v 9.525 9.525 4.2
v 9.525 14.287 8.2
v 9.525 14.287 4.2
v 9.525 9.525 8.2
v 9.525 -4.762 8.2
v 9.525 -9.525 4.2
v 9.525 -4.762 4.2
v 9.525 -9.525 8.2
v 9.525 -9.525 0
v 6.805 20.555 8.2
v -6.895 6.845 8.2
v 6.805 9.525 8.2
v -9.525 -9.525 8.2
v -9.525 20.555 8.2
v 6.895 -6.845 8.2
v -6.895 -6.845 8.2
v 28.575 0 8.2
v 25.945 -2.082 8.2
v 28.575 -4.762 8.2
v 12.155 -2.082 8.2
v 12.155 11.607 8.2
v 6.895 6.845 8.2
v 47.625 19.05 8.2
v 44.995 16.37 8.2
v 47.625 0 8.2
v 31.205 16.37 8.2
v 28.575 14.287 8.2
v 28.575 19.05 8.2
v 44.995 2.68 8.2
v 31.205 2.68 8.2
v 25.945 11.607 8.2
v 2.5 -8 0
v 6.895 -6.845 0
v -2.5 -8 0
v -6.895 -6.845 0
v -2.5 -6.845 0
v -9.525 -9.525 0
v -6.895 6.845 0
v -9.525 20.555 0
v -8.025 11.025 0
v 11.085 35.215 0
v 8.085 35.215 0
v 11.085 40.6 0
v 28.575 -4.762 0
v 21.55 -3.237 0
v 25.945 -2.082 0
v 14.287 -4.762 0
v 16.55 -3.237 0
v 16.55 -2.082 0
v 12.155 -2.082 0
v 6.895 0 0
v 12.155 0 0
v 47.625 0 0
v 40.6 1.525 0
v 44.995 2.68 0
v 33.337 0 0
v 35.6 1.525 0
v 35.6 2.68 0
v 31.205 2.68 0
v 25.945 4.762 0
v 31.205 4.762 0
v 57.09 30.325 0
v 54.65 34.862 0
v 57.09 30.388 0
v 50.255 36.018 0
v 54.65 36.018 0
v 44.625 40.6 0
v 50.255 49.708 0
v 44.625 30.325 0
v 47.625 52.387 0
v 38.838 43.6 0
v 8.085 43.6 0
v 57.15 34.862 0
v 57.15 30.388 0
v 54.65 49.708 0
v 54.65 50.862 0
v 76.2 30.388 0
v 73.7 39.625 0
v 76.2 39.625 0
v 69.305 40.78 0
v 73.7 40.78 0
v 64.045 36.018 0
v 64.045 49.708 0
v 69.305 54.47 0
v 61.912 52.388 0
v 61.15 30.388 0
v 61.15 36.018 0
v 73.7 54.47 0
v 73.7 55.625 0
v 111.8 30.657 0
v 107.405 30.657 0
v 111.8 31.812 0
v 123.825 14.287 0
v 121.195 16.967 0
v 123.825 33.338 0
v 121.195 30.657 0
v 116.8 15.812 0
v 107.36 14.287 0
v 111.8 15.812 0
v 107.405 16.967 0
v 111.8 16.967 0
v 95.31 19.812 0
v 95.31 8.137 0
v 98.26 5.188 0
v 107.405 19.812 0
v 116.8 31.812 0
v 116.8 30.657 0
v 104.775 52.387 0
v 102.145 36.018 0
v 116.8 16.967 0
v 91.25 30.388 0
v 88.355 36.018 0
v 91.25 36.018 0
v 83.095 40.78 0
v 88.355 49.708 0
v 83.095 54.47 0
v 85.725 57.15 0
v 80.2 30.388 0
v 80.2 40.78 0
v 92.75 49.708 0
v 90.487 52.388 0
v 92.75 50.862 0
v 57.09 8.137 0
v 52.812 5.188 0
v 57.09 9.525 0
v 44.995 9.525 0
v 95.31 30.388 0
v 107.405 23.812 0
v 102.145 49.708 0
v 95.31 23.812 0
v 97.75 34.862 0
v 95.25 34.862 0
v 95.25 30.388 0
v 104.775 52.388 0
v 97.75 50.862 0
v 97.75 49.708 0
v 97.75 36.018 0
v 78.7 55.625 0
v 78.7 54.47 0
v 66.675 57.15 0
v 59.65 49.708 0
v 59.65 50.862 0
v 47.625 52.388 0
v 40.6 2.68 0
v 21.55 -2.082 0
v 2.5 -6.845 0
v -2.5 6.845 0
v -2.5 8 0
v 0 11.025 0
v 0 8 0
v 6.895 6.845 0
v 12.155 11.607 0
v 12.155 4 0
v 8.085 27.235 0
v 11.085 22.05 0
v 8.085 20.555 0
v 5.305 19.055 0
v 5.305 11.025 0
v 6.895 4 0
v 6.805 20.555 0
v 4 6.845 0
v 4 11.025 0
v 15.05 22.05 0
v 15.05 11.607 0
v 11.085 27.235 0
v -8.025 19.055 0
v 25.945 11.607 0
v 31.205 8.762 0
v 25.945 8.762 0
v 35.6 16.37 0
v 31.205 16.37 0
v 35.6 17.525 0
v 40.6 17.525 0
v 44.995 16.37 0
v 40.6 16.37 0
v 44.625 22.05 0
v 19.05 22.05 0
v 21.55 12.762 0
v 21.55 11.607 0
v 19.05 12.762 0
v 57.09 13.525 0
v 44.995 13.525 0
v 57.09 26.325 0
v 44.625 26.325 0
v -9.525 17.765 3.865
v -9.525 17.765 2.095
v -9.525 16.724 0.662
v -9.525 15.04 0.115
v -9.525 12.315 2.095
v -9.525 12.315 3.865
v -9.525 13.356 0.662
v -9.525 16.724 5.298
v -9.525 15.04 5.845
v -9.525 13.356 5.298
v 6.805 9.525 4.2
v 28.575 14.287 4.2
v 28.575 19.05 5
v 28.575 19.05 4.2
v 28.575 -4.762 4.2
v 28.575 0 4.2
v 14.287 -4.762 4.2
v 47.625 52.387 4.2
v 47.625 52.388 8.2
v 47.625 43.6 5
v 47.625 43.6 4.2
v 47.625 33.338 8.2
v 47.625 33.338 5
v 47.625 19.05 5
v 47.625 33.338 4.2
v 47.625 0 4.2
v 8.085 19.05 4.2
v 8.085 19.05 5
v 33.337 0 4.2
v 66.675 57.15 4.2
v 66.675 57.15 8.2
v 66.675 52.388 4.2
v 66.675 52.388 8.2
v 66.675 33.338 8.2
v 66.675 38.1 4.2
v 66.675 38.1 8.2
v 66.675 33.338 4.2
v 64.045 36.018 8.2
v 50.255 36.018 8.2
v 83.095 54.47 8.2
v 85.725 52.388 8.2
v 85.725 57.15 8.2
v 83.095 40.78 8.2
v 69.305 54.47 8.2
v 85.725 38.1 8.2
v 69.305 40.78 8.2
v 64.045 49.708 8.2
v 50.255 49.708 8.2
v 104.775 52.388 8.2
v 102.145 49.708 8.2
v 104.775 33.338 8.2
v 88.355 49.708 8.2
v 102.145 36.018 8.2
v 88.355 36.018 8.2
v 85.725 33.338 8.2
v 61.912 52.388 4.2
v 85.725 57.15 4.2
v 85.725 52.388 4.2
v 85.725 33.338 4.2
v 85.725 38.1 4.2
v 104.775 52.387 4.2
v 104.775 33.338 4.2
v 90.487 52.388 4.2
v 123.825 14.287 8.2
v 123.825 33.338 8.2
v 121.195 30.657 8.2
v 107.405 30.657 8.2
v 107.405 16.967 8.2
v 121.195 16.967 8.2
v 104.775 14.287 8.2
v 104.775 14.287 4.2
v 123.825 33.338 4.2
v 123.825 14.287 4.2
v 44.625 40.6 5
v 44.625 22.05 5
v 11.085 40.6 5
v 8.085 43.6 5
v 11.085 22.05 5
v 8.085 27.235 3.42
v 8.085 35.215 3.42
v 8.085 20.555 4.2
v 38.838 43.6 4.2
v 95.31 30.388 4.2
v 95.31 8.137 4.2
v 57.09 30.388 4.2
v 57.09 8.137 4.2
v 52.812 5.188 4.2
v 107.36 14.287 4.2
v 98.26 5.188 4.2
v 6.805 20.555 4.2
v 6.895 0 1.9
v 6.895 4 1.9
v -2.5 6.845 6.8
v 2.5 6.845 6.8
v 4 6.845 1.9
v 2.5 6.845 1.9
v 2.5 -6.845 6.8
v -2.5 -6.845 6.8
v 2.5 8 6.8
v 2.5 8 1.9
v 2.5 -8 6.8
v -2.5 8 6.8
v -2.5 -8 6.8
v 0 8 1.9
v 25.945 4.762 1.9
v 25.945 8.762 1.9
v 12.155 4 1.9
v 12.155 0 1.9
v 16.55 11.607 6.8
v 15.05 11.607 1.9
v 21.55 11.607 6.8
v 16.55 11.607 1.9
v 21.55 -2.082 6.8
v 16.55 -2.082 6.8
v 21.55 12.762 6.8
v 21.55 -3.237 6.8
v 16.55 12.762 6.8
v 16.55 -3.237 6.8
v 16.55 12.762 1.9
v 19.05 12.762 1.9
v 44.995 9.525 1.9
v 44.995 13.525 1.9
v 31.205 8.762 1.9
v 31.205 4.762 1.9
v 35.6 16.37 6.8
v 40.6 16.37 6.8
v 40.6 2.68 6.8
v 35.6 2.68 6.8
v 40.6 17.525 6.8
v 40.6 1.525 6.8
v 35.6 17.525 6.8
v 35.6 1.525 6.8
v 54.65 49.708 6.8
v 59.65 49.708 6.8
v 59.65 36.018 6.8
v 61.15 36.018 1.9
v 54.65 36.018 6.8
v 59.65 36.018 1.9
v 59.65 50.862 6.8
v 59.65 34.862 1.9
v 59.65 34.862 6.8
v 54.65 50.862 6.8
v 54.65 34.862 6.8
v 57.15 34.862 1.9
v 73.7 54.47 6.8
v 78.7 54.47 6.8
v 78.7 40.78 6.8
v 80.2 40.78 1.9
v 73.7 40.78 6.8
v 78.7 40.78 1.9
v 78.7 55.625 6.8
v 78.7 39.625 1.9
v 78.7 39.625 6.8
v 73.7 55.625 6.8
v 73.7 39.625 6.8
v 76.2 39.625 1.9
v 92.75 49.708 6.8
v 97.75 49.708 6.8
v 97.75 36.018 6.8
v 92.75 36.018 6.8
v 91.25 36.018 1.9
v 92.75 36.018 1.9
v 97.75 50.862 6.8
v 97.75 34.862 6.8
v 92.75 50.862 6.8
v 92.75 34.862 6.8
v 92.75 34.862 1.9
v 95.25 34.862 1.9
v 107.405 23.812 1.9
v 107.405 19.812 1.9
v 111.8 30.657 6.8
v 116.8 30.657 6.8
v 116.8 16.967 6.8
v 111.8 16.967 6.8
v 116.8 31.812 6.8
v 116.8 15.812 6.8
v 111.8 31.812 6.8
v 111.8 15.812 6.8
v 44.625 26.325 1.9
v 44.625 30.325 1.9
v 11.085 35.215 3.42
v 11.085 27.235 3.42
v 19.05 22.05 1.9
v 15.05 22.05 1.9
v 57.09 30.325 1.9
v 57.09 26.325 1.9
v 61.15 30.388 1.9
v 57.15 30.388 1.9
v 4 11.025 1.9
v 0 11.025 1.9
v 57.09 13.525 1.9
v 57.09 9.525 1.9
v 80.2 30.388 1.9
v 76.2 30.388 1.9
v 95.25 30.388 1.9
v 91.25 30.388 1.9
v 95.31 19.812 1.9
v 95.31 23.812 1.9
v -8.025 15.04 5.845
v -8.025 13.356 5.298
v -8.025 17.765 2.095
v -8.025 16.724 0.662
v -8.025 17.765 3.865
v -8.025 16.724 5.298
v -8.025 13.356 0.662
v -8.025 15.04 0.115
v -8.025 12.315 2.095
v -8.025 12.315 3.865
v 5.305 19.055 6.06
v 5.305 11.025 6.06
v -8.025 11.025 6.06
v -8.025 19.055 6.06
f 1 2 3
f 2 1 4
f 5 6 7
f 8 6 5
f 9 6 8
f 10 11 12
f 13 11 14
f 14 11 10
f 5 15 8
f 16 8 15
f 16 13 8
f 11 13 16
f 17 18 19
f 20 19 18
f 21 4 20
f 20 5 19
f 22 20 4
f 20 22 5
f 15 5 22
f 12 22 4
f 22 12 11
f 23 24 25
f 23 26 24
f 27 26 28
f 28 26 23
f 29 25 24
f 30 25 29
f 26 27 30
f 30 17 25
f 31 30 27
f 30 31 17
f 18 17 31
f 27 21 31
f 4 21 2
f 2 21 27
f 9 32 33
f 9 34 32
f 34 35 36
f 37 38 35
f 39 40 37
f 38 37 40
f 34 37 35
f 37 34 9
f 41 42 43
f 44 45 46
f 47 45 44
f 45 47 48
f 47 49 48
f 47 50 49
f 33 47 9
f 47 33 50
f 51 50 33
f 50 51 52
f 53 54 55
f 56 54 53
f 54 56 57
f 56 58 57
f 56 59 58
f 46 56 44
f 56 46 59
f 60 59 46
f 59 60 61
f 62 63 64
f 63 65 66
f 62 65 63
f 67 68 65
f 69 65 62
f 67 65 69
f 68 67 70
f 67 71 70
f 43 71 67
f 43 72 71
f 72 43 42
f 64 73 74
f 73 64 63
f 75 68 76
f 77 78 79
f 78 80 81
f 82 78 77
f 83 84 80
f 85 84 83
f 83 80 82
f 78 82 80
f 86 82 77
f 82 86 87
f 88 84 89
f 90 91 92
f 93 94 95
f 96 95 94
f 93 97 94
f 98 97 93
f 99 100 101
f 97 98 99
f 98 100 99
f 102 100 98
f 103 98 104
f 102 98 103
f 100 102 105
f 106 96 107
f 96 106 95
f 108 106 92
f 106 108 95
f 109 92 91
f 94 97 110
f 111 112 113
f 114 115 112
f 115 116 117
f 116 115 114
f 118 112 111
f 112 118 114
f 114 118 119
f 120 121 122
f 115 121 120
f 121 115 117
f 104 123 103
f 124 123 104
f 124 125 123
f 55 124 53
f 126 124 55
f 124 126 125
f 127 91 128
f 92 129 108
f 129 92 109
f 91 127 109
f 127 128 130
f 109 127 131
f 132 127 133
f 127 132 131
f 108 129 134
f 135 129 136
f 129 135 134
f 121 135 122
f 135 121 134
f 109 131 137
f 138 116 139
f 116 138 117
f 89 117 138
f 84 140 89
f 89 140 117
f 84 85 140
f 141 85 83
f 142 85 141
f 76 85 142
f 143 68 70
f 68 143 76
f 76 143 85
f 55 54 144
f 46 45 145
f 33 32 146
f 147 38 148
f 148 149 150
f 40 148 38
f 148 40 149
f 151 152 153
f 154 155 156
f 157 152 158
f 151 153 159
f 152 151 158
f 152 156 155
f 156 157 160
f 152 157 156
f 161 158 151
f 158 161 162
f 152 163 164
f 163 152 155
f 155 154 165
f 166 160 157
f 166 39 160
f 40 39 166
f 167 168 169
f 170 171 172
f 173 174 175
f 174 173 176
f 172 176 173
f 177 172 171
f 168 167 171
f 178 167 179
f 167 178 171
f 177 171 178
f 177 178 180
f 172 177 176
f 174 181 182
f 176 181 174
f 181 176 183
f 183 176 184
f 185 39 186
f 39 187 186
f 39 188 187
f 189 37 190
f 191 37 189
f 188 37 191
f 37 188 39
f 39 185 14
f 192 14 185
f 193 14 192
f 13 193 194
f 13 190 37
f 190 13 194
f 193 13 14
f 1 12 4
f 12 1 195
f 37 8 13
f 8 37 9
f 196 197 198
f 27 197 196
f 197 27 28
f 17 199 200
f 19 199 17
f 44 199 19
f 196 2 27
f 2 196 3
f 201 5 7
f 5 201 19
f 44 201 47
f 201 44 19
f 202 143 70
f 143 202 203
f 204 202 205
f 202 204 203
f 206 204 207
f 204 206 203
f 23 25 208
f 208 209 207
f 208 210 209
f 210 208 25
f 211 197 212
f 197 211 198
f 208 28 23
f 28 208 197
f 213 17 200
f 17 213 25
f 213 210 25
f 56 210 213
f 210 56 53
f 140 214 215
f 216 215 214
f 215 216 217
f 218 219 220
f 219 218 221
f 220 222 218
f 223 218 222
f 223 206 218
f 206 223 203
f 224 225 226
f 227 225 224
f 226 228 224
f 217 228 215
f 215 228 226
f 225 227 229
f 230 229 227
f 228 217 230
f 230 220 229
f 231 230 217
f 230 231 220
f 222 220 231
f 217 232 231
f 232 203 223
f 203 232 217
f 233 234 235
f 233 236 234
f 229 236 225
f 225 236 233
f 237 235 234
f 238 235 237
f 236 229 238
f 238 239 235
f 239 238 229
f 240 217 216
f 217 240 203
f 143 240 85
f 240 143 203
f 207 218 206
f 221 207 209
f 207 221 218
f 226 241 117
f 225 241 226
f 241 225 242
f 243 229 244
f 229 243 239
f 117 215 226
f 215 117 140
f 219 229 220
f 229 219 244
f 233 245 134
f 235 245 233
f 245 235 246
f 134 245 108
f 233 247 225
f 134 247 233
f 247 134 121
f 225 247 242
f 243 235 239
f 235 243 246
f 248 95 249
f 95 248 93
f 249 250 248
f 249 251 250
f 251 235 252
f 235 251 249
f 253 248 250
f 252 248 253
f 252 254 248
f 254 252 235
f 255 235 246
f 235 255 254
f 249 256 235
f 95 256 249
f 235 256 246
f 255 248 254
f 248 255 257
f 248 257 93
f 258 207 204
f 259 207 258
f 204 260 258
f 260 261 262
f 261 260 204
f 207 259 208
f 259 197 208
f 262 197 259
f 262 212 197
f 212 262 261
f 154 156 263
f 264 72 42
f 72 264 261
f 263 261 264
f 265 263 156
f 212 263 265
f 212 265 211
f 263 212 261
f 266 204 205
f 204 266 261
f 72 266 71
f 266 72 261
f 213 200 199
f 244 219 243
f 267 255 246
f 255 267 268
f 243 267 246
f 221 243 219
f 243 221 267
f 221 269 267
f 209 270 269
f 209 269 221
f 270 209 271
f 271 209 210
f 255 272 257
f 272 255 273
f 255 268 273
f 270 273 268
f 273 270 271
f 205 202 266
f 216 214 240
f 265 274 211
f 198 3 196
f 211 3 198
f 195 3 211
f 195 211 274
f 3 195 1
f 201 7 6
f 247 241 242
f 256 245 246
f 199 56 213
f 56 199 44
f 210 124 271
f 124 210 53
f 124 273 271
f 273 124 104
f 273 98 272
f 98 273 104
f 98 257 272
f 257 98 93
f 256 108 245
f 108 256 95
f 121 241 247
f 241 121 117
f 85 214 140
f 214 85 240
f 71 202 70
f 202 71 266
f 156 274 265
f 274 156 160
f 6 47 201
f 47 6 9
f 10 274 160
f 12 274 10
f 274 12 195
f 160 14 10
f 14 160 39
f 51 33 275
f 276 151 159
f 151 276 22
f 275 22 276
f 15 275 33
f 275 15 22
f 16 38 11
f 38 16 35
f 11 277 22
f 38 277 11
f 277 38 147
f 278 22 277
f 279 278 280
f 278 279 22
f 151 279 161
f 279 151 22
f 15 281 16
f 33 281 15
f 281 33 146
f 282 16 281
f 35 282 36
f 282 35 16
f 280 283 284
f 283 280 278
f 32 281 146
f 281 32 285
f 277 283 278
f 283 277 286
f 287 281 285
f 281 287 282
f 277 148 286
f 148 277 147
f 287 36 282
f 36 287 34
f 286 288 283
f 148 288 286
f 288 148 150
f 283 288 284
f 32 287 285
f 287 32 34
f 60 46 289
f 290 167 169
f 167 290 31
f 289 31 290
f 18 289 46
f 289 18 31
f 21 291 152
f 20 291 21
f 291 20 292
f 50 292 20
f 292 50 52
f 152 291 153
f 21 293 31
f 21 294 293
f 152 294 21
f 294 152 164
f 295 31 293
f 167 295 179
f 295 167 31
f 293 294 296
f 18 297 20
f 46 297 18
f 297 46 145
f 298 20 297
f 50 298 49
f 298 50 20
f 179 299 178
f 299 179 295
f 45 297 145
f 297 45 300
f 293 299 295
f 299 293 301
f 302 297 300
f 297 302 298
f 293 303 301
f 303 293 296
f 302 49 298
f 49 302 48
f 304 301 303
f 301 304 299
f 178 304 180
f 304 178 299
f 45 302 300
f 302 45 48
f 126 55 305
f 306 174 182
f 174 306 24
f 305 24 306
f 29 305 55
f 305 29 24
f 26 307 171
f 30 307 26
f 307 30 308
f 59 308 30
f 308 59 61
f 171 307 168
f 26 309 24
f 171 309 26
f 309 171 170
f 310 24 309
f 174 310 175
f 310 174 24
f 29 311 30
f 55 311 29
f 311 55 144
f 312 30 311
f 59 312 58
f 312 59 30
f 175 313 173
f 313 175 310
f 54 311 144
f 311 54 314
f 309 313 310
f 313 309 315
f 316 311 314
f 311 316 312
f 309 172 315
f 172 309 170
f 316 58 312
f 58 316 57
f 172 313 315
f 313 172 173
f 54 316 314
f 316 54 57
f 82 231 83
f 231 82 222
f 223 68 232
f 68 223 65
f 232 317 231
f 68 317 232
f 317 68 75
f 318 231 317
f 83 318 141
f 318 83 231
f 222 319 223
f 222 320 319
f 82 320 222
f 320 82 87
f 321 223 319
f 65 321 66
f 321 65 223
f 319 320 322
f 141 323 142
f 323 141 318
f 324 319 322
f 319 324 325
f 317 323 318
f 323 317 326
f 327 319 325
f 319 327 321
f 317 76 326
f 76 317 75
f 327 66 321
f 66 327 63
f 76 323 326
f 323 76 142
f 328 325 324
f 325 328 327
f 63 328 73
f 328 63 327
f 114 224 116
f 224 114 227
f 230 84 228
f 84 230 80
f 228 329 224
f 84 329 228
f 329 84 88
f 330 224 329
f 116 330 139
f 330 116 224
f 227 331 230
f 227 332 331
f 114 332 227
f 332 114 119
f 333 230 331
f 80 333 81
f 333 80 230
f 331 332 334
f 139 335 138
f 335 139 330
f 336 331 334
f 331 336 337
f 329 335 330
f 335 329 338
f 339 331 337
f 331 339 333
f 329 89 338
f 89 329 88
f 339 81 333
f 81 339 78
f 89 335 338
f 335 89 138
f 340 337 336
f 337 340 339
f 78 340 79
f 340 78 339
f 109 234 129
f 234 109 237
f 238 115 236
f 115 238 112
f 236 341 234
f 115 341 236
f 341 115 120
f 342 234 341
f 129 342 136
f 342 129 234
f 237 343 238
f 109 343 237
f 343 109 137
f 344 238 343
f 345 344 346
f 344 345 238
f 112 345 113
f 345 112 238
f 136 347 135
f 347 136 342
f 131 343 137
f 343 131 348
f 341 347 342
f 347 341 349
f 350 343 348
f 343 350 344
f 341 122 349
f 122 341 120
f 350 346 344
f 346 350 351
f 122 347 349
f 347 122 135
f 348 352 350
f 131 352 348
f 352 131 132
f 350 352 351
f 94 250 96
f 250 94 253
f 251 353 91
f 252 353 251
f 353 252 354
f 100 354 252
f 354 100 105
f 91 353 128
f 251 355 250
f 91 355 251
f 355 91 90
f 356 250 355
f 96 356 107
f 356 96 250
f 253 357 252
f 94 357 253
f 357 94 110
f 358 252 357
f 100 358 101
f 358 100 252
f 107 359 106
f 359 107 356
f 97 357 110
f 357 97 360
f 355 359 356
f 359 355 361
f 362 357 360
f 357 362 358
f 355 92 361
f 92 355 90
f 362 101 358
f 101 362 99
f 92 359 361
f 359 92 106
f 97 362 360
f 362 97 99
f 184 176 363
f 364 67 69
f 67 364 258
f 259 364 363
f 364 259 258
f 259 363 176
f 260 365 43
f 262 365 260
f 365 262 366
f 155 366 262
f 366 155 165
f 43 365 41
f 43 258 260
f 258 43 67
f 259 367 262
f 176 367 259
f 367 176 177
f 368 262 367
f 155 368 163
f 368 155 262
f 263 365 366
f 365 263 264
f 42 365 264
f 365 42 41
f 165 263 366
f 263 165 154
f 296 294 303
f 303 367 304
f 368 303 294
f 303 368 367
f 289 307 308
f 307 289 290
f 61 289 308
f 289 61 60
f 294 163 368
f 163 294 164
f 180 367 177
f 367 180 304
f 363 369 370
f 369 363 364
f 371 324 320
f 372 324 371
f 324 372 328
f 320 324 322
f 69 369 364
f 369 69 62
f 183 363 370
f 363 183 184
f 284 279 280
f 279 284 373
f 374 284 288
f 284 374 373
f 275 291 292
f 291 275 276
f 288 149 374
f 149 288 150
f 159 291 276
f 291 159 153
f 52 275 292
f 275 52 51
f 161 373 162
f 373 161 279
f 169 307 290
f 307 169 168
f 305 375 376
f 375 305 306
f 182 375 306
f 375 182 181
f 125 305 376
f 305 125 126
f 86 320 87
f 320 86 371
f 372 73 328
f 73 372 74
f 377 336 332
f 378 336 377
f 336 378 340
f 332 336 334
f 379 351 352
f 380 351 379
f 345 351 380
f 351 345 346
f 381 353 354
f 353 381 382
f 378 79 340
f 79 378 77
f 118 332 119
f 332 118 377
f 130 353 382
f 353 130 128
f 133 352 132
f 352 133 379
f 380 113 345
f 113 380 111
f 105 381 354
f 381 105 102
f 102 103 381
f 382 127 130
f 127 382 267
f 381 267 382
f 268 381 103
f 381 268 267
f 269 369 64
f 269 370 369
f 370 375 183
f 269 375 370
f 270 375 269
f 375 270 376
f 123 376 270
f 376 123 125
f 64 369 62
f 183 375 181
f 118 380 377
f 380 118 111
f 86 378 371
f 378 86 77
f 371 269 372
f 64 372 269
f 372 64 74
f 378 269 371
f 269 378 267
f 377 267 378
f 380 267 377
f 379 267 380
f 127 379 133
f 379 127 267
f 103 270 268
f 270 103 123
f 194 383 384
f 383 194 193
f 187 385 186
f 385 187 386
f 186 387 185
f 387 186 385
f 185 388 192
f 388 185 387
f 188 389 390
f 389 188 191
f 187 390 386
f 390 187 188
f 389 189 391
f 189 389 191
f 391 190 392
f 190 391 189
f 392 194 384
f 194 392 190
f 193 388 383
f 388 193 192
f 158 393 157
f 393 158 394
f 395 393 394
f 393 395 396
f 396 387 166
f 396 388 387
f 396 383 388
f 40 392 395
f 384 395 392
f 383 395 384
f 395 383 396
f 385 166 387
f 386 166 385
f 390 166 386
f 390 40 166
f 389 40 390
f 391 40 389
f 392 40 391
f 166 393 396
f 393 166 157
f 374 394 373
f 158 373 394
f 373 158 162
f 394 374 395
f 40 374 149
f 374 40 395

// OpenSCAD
SIDE = "right";
GRID_SIZE = 19.05;
MX_SOCKET = [["height", 8.2], ["tolerance", -0.11]];
BASE_HEIGHT = 5;

THUMB1 = [["position", GridCoords(0, 0, 0)]];
THUMB2 = [["position", GridCoords(1, 0.25, 0)]];
THUMB3 = [["position", GridCoords(2, 0.5, 0)]];
INDEX = [["position", GridCoords(3, 2.25, 0)]];
MIDDLE = [["position", GridCoords(4, 2.5, 0)]];
RING = [["position", GridCoords(5, 2.25, 0)]];
LITTLE = [["position", GridCoords(6, 1.25, 0)]];

SWITCH_PLACEMENT = [
    THUMB1,
    THUMB2,
    THUMB3,
    INDEX,
    MIDDLE,
    RING,
    LITTLE
];

IO_BOARD = [
    ["size", [38.12, 22.15, 11]],
    ["tolerance", 0.1],
    ["border", 3],
];
MCU_BOARD = [
    ["size", [33.34, 18.35, 10]],
    ["tolerance", 0.1],
    ["border", 3],
    ["port", [7.98, 3.52]]
];

TRRS = [
    ["size", [13.23, 7.93, 6.11]],
    ["port_dia", 5.53],
    ["tolerance", 0.1],
    ["border", 3],
];

IO_BOARD_POSITION = [
    middle(left(LITTLE), right(THUMB3)),
    min(bottom(INDEX), bottom(RING)) - get(IO_BOARD, "border") - get(IO_BOARD, "size").y / 2,
    0
];

IO_BOARD_BORDER_BOTTOM_RIGHT = [
    IO_BOARD_POSITION.x + get(IO_BOARD, "size").x / 2 + get(IO_BOARD, "border"),
    IO_BOARD_POSITION.y - get(IO_BOARD, "size").y / 2 - get(IO_BOARD, "border")
];

function mcu_board_housing() =
    let(
        board = get(MCU_BOARD, "size"),
        tolerance = get(MCU_BOARD, "tolerance"),
        border = get(MCU_BOARD, "border"),
        housing = grow(board, 2 * (tolerance + border))
    )
    [housing.x, housing.y, BASE_HEIGHT];
function mcu_board_housing_position() =
    let(
        housing_x = mcu_board_housing().x,
        x = left(INDEX) - housing_x,
        y = top(THUMB3)
    )
    [x, y, 0];
function mcu_board_housing_centre_xy() =
    let(
        position = mcu_board_housing_position(),
        size = mcu_board_housing()
    )
    [position.x + size.x / 2, position.y + size.y / 2, 0];
function mcu_board_cavity() =
    let(
        tolerance = get(MCU_BOARD, "tolerance"),
        size = grow(get(MCU_BOARD, "size"), 2 * tolerance)
    )
    [size.x, size.y, 11];



MCU_BOARD_CENTRE = [
    left(INDEX) - get(MCU_BOARD, "border") - get(MCU_BOARD, "size").x / 2,
    top(THUMB3) + get(MCU_BOARD, "border") + get(MCU_BOARD, "size").y / 2
];

MCU_BOARD_BORDER_TOP_LEFT = [
    MCU_BOARD_CENTRE.x - get(MCU_BOARD, "size").x / 2 - get(MCU_BOARD, "border"),
    MCU_BOARD_CENTRE.y + get(MCU_BOARD, "size").y / 2 + get(MCU_BOARD, "border")
];

MCU_BOARD_BORDER_BOTTOM_LEFT = [
    MCU_BOARD_BORDER_TOP_LEFT.x,
    MCU_BOARD_CENTRE.y - get(MCU_BOARD, "size").y / 2 - get(MCU_BOARD, "border")
];

TRRS_CAVITY = grow(get(TRRS, "size"), get(TRRS, "tolerance"));

TRRS_OUTER_INIT = grow(TRRS_CAVITY, get(TRRS, "border"));
TRRS_OUTER = [TRRS_OUTER_INIT.x, TRRS_OUTER_INIT.y, get(MX_SOCKET, "height")];

TRRS_OUTER_POSITION = [left(THUMB1), top(THUMB1), 0];

CHANNEL_XSEC = [4, 2];

BASE = [
    ["height", 4.2],
    ["polygon", [
        bottom_left(THUMB1),
        bottom_right(THUMB1),
        diag_l2r(bottom_right(THUMB1), bottom(THUMB2)),
        bottom_right(THUMB2),
        diag_l2r(bottom_right(THUMB2), bottom(THUMB3)),
        bottom_right(THUMB3),
        diag_l2r(bottom_right(THUMB3), IO_BOARD_BORDER_BOTTOM_RIGHT.y),
        IO_BOARD_BORDER_BOTTOM_RIGHT,
        diag_l2r(IO_BOARD_BORDER_BOTTOM_RIGHT, bottom(LITTLE)),
        bottom_left(LITTLE),
        bottom_right(LITTLE),
        top_right(LITTLE),
        diag_r2l(top_right(RING), top(LITTLE)),
        top_right(RING),
        diag_r2l(top_right(MIDDLE), top(RING)),
        top_right(MIDDLE),
        top_left(MIDDLE),
        diag_l2r(top_left(MIDDLE), top(INDEX)),
        top_left(INDEX),
        diag_l2r(top_left(INDEX), TRRS_OUTER_POSITION.y + TRRS_OUTER.y),
        [TRRS_OUTER_POSITION.x, TRRS_OUTER_POSITION.y + TRRS_OUTER.y],
        top_left(THUMB1),
    ]]
];

function is_in(set, value) = set[0]==value ? true : false;
function tail(set) = len(set) >1 ? [for(i=[1:1:len(set)-1]) set[i]] : undef;
function head(set) = is_list(set) ? set[0] : undef;
function get(set, value) = set == undef ? undef : is_in(head(set), value) ? head(set)[1] : get(tail(set), value); 

function GridCoords(x, y, z) = [x*GRID_SIZE, y*GRID_SIZE, z*GRID_SIZE];    //Translate switch according to grid

function bottom(switch) =
    let(centre = get(switch, "position"))
    centre.y - GRID_SIZE / 2;
function top(switch) =
    let(centre = get(switch, "position"))
    centre.y + GRID_SIZE / 2;
function left(switch) =
    let(centre = get(switch, "position"))
    centre.x - GRID_SIZE / 2;
function right(switch) =
    let(centre = get(switch, "position"))
    centre.x + GRID_SIZE / 2;
function top_left(switch) = [left(switch), top(switch)];
function top_right(switch) = [right(switch), top(switch)];
function bottom_left(switch) = [left(switch), bottom(switch)];
function bottom_right(switch) = [right(switch), bottom(switch)];

function diag_l2r(start_position, y_to) =
    let(dist = y_to - start_position.y)
    [start_position.x + dist, y_to];

function diag_r2l(start_position, y_to) =
    let(dist = y_to - start_position.y)
    [start_position.x - dist, y_to];

function min(a, b) = a > b ? a : b;

function middle(first, second) =
    (first - second) / 2 + second;

function grow(size, modifier) =
    [size.x + modifier, size.y + modifier, size.z + modifier / 2];

function centre(position, size) =
    [position.x + size.x / 2, position.y + size.y / 2, position.z + size.z / 2];


module SocketColumn(position) {
    let(
        height = get(MX_SOCKET, "height")
    ){
        union(){
            translate([position.x, position.y, position.z + height/2]) 
                cube([GRID_SIZE, GRID_SIZE, height], center = true);

            translate([position.x, position.y, (position.z/2)]) 
                cube([GRID_SIZE, GRID_SIZE, position.z], center = true);
        } 
    }    
}

module MXCutout(position) {
    let(
        tolerance = get(MX_SOCKET, "tolerance"),
        height = get(MX_SOCKET, "height"),
        x = 13.9+tolerance,
        y = 13.8+tolerance,
        x2 = 5,
        y2 = 16        
    ){       
        translate([position.x, position.y, (position.z/2) + height/2]) 
            cube([x, y, position.z + height+0.1], center = true);        

        translate([position.x, position.y, (position.z/2) + height/2-1.4])
            cube([x2, y2, position.z + height], center = true);
    }
}

module IoCutout() {
    let(
        tolerance = get(IO_BOARD, "tolerance"),
        size = get(IO_BOARD, "size"),
        adjusted_size = [size.x + tolerance, size.y + tolerance, size.z]
    ){
        translate(IO_BOARD_POSITION)
            cube(size = adjusted_size, center = true);
    }
}

module McuCutout() {
    let(
        centre = mcu_board_housing_centre_xy()
    )
    translate([centre.x, centre.y, 0])
    cube(mcu_board_cavity(), center = true);
}

module McuPortCutout() {
    let(
        port = get(MCU_BOARD, "port"),
        x_offset = -mcu_board_housing().x / 2,
        y_offset = MCU_BOARD_CENTRE.y - port.x / 2
    ){
        translate([mcu_board_housing_position().x, y_offset, 0])
        translate([-0.1, 0, -0.1])
        cube([5, port.x, port.y]);
    }
}

module TrrsPortCutout() {
    let(
        tolerance = get(TRRS, "tolerance"),
        length = get(TRRS, "size").x,
        radius = get(TRRS, "port_dia") / 2 + tolerance
    ){
        translate([left(THUMB1), centre(TRRS_OUTER_POSITION, TRRS_OUTER).y, TRRS_CAVITY.z / 2 - tolerance])
        rotate([0, 90, 0])
            cylinder(h = length, r = radius, center = true);
    }
}

module TrrsCavityCutout() {
    let(
        centre = centre(TRRS_OUTER_POSITION, TRRS_OUTER)
    ){
        translate([centre.x, centre.y, TRRS_CAVITY.z / 2 - get(TRRS, "tolerance")])
            cube(TRRS_CAVITY, center = true);
    }
}

module MakeSockets() {
        for (switch = SWITCH_PLACEMENT) {
            SocketColumn(get(switch, "position"));
        }
}

module MakeBaseplate() {
    linear_extrude(get(BASE, "height"))
        polygon(get(BASE, "polygon"));
}

module MakeCutouts() {
    for (switch = SWITCH_PLACEMENT) {
        MXCutout(get(switch, "position"));
    }
    IoCutout();
    if (SIDE == "right") {
        McuCutout();
        McuPortCutout();
    }
    TrrsPortCutout();
    TrrsCavityCutout();
    MakeChannels();
}


module MakeChannels() {
    translate(get(THUMB1, "position"))
    translate([0, 0, -0.1])
        cube([GRID_SIZE, CHANNEL_XSEC.x, CHANNEL_XSEC.y]);

    translate(get(THUMB1, "position"))
    translate([0, 0, -0.1])
    rotate([0, 0, 90])
    mirror([0, 1, 0])
        cube([GRID_SIZE / 1.5, CHANNEL_XSEC.x, CHANNEL_XSEC.y]);

    translate(get(THUMB2, "position"))
    translate([0,0, -0.1])
        cube([GRID_SIZE, CHANNEL_XSEC.x, CHANNEL_XSEC.y]);

    translate(get(THUMB3, "position"))
    translate([0,0, -0.1])
        cube([GRID_SIZE, CHANNEL_XSEC.x, CHANNEL_XSEC.y]);

    translate(get(INDEX, "position"))
    translate([0, 0, -0.1])
    rotate([0, 0, -90])
        cube([GRID_SIZE, CHANNEL_XSEC.x, CHANNEL_XSEC.y]);

    translate(get(MIDDLE, "position"))
    translate([0, 0, -0.1])
    rotate([0, 0, -90])
        cube([GRID_SIZE * 2, CHANNEL_XSEC.x, CHANNEL_XSEC.y]);
    
    translate(get(RING, "position"))
    translate([0, 0, -0.1])
    rotate([0, 0, 90])
    mirror([1, 0, 0])
        cube([GRID_SIZE, CHANNEL_XSEC.x, CHANNEL_XSEC.y]);

    translate(get(LITTLE, "position"))
    translate([0, 0, -0.1])
    rotate([0, 0, 180])
        cube([GRID_SIZE * 2, CHANNEL_XSEC.x, CHANNEL_XSEC.y]);

    if (SIDE == "right") {
        translate(get(THUMB2, "position"))
        translate([0,0, -0.1])
        rotate([0, 0, 90])
            cube([GRID_SIZE, CHANNEL_XSEC.x, CHANNEL_XSEC.y]);

        translate(MCU_BOARD_CENTRE)
        translate([0, -0.9, -0.1])
        mirror([0, 1, 0])
            cube([GRID_SIZE * 2, CHANNEL_XSEC.x, CHANNEL_XSEC.y]);
    }
}

module MakeTrrsOuter() {
    translate(TRRS_OUTER_POSITION)
        cube(TRRS_OUTER);
}

module MakeMcuHousing() {
    if (SIDE == "right") {
        translate(mcu_board_housing_position())
        cube(mcu_board_housing());
    }
}

MIRROR = SIDE == "right" ? 0 : 1;

mirror([MIRROR, 0, 0])
difference() {
    union() {
        MakeSockets();
        MakeMcuHousing();
        MakeBaseplate();
        MakeTrrsOuter();
        
    }
    MakeCutouts();
}
